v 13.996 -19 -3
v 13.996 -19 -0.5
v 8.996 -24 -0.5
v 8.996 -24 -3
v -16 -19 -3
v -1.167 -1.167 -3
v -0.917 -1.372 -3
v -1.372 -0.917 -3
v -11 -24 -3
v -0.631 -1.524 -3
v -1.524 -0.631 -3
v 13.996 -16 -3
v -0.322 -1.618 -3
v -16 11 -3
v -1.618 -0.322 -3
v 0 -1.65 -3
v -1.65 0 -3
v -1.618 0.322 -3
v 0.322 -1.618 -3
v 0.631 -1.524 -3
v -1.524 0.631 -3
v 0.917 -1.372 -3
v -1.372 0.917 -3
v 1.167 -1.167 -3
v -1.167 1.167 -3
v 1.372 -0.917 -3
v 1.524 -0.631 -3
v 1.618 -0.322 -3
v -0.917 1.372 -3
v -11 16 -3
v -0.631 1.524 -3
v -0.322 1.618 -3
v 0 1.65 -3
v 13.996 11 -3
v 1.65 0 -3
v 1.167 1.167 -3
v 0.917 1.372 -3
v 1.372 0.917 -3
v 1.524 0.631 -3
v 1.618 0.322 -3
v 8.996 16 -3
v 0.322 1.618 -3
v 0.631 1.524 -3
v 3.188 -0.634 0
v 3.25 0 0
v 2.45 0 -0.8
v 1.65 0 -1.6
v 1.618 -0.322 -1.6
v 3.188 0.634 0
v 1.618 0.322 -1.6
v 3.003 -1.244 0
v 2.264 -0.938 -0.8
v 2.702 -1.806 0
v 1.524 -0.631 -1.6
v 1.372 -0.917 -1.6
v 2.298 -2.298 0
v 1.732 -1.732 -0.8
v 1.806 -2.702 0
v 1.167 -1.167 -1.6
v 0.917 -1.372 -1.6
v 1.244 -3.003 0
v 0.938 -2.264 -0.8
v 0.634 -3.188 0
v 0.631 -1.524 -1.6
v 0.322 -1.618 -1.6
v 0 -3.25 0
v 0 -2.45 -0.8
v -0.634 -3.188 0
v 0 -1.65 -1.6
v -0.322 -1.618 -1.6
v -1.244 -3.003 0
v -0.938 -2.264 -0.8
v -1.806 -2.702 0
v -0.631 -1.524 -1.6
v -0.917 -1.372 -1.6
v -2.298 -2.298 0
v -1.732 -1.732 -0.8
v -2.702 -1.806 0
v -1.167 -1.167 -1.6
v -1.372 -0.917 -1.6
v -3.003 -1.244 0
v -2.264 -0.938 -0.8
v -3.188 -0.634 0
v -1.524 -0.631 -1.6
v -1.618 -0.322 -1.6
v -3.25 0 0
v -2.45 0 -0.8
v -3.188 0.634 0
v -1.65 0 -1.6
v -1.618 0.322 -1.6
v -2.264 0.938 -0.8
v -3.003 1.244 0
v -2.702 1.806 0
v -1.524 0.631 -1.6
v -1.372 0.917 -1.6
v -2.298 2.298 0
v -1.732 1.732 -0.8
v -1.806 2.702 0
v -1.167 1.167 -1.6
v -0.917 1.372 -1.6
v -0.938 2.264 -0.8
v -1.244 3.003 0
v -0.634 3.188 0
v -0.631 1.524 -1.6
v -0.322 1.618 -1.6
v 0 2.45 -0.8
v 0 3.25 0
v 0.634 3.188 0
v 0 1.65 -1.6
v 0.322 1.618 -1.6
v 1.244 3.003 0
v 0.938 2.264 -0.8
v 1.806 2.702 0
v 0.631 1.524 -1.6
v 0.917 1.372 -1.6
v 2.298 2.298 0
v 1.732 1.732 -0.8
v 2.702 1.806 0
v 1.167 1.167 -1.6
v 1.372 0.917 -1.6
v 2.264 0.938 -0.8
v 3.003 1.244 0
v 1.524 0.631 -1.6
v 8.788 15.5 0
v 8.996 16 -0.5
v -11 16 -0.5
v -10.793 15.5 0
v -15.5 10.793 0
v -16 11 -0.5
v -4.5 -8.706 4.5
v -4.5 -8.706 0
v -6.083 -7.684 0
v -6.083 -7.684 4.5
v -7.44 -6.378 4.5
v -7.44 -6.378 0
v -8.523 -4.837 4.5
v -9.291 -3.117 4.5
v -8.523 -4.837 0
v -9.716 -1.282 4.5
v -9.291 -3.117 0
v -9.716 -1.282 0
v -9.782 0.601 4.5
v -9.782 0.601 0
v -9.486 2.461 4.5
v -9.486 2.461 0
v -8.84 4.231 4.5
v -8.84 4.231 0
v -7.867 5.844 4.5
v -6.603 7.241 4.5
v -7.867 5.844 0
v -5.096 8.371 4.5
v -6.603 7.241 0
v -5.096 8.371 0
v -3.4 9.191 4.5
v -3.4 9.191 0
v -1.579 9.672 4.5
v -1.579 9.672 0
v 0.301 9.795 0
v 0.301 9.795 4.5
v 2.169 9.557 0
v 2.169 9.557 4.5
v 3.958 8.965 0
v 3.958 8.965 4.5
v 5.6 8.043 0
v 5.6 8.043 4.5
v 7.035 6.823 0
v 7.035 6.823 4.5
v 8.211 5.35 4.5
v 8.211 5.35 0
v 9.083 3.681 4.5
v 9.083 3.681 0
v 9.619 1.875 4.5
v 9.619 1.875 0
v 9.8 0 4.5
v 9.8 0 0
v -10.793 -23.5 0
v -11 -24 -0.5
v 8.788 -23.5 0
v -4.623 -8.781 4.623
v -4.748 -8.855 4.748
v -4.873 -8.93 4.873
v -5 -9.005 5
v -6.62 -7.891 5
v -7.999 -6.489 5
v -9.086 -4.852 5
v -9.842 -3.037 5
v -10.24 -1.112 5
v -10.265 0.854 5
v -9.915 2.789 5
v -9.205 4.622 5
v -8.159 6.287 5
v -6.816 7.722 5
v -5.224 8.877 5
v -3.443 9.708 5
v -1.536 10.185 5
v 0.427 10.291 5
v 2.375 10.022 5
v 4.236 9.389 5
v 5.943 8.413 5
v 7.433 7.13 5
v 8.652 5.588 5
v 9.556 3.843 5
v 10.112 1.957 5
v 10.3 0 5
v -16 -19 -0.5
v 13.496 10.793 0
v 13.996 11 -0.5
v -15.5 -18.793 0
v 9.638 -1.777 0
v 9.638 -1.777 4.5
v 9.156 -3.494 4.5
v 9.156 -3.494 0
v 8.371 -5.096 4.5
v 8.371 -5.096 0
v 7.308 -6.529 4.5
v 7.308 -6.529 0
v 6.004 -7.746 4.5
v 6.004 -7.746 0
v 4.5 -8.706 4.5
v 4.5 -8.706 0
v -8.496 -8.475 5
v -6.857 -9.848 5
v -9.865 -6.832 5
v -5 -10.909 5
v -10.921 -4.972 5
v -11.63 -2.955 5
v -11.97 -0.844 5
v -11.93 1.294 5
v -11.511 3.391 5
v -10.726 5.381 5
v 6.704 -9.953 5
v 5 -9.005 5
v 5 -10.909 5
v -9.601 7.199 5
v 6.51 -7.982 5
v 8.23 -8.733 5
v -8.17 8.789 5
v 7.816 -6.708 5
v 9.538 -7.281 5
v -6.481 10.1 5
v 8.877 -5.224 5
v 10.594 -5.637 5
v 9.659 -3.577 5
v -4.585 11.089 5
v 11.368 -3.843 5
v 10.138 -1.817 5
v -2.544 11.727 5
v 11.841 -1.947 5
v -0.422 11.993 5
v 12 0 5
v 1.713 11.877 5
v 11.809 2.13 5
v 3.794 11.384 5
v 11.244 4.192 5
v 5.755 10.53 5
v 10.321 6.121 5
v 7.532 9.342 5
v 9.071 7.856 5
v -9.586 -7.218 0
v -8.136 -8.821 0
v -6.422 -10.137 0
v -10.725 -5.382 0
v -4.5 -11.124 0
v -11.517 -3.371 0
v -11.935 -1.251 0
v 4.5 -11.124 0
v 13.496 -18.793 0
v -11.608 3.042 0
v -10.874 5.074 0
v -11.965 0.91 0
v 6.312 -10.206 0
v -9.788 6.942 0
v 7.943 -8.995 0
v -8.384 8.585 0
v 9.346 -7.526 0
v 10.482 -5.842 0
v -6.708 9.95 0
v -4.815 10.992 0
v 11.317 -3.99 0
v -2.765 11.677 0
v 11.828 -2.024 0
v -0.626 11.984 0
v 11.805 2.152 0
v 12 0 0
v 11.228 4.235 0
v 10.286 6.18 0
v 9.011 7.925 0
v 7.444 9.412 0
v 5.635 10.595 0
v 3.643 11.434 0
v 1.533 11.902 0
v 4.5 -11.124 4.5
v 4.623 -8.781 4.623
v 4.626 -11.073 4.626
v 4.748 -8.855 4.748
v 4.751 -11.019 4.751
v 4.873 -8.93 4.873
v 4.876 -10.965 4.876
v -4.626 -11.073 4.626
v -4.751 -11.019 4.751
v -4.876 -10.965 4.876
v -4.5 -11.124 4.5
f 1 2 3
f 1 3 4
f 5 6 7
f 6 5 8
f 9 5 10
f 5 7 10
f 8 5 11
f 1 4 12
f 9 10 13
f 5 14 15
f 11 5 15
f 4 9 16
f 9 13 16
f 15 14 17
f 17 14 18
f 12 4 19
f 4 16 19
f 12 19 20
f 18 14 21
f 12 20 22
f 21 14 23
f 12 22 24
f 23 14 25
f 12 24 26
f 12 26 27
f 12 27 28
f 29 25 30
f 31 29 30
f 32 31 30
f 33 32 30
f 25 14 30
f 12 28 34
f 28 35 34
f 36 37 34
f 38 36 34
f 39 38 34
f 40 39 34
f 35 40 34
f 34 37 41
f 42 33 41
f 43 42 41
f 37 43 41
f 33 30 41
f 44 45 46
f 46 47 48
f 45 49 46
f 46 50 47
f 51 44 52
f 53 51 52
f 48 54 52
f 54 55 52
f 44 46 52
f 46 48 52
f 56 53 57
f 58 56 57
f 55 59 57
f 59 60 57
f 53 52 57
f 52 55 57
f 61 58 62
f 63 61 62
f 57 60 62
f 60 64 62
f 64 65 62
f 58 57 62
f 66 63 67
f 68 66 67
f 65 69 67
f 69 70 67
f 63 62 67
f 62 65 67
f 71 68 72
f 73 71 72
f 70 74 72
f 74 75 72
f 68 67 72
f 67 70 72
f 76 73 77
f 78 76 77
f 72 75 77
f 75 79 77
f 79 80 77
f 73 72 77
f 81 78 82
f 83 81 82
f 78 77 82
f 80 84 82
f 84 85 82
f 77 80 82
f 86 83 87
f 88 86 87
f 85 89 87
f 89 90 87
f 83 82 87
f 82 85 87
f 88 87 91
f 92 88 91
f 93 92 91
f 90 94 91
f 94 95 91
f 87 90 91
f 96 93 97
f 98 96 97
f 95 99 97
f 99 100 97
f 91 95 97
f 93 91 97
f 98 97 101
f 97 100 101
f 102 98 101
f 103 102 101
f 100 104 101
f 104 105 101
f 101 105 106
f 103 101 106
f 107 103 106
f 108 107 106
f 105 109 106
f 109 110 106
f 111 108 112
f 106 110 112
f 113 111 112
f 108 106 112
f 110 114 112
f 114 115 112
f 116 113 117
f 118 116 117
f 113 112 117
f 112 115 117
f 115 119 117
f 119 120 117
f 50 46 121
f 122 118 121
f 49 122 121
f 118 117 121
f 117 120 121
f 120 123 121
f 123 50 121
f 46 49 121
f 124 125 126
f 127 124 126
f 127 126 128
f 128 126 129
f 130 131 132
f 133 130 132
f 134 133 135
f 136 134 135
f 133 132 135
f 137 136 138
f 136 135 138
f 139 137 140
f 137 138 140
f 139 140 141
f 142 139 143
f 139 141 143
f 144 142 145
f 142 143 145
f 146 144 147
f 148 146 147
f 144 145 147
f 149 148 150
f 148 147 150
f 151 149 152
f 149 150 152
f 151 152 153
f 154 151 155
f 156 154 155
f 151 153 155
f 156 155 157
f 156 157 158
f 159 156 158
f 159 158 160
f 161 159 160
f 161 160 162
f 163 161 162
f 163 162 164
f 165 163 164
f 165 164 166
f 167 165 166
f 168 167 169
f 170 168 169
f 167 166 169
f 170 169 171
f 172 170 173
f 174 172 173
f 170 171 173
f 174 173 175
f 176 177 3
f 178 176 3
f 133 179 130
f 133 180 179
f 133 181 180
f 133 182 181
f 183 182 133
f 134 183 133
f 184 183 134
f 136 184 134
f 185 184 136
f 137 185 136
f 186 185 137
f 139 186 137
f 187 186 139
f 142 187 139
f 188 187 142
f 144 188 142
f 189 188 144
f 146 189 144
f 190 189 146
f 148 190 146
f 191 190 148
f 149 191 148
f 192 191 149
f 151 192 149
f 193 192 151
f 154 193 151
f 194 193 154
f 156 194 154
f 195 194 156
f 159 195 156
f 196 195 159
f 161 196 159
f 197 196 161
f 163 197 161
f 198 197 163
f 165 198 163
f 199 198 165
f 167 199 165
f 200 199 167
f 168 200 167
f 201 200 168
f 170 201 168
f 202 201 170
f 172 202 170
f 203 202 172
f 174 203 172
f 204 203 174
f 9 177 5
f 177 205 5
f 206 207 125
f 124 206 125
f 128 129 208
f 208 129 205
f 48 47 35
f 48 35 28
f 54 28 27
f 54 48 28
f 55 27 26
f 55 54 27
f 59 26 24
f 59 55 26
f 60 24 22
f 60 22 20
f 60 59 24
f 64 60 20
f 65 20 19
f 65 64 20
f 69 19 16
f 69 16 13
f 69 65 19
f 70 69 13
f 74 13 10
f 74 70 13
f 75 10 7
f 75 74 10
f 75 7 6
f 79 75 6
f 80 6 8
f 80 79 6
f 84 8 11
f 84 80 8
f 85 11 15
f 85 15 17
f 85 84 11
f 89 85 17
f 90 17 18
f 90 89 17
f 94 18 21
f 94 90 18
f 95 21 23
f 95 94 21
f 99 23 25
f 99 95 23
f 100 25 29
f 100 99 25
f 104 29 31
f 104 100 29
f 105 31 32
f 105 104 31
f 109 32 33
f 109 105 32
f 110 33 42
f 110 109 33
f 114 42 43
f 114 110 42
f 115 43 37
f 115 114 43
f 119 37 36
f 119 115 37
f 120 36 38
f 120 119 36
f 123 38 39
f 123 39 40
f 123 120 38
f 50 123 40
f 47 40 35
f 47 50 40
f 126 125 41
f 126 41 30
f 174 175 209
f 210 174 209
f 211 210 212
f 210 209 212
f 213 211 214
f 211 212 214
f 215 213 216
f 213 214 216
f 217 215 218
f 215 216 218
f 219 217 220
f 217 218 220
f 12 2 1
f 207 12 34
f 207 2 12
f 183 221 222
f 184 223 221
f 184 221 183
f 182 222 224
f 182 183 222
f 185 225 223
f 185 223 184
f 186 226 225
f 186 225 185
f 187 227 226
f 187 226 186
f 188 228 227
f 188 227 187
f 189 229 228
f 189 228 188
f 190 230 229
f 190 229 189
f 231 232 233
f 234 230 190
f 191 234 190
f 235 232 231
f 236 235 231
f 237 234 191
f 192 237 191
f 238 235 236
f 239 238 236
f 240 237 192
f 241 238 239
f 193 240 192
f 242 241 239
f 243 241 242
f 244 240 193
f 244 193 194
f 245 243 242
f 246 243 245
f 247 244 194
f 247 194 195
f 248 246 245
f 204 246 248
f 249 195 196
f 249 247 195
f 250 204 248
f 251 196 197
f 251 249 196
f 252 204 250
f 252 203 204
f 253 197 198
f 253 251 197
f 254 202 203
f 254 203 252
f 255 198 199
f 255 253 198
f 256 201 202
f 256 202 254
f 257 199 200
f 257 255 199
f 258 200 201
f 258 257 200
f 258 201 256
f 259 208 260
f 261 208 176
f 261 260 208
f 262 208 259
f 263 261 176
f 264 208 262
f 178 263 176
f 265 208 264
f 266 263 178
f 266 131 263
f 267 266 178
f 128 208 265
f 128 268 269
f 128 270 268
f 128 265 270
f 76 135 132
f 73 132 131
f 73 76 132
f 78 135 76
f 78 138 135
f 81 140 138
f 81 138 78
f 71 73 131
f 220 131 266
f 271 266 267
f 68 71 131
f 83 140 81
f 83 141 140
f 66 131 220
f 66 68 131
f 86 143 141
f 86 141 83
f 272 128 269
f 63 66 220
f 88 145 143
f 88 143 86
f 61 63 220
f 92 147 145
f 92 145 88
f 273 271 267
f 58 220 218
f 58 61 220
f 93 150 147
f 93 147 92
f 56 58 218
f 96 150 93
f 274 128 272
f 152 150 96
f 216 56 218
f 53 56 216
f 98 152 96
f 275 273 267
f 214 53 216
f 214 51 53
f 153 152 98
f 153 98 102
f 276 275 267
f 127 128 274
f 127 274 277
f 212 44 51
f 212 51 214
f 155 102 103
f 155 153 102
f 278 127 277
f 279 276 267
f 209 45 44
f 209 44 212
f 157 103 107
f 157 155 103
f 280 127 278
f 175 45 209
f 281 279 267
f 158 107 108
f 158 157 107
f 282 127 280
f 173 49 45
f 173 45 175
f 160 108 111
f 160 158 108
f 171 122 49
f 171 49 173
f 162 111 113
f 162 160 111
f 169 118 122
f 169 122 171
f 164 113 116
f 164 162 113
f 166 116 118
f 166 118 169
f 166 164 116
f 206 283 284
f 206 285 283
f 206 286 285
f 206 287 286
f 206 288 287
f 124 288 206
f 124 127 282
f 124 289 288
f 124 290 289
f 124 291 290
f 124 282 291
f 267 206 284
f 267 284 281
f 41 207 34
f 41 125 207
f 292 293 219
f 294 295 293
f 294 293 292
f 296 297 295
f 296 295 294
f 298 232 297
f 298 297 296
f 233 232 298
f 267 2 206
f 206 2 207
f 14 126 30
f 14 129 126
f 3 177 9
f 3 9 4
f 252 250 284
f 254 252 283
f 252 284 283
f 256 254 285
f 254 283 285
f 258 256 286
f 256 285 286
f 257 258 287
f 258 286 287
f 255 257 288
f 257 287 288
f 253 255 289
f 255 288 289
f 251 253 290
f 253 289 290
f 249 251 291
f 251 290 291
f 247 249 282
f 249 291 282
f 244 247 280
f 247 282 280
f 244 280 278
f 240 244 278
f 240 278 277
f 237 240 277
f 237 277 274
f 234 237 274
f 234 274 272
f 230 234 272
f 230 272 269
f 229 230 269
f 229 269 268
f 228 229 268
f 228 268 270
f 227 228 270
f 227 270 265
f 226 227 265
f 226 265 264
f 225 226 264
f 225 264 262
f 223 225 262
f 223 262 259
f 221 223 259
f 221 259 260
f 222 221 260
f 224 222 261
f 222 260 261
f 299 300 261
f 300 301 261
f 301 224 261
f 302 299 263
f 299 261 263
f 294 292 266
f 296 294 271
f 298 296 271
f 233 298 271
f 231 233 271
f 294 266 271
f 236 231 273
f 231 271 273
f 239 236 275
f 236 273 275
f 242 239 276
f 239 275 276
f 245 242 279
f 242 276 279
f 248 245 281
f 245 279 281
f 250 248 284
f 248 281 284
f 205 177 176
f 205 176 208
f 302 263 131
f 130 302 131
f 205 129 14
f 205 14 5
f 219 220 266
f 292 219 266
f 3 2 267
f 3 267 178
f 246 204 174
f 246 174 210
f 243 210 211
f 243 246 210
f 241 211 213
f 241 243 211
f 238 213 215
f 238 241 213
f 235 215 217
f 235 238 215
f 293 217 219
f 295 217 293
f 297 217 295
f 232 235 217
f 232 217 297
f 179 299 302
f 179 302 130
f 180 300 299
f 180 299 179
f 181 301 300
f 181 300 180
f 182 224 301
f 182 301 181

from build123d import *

# Parameters (mm, degrees)
F0_W     = 11.5
F0_H     = 8
F0_W_2   = 9
F0_W_3   = 9.4955122173
F1_DEPTH = 3
F2_DEPTH = 5
F3_SIZE  = 1.6
F4_SIZE  = 5
F5_SIZE  = 0.5


with BuildPart() as f1:
    # F0 (on Top) → F1 (new body)
    with BuildSketch(Plane.XY):
        with BuildLine():
            Line((-4.5, -16), (-4.5, -11.1242977306))
            ThreePointArc((-4.5, -11.1242977306), (-6.7082039325, 9.9498743711), (12, 0))
            ThreePointArc((12, 0), (9.9498743711, -6.7082039325), (4.5, -11.1242977306))
            Line((4.5, -11.1242977306), (4.5, -16))
            Line((4.5, -16), (13.9955122173, -16))
            Line((13.9955122173, -16), (13.9955122173, 16))
            Line((13.9955122173, 16), (-16, 16))
            Line((-16, 16), (-16, -16))
            Line((-16, -16), (-4.5, -16))
        make_face()
        with BuildLine():
            ThreePointArc((-4.5, -8.7057452294), (-5.0960769225, 8.3707825202), (9.8, 0))
            ThreePointArc((9.8, 0), (8.3707825202, -5.0960769225), (4.5, -8.7057452294))
            Line((4.5, -8.7057452294), (4.5, -11.1242977306))
            ThreePointArc((4.5, -11.1242977306), (9.9498743711, -6.7082039325), (12, 0))
            ThreePointArc((12, 0), (-6.7082039325, 9.9498743711), (-4.5, -11.1242977306))
            Line((-4.5, -11.1242977306), (-4.5, -8.7057452294))
        make_face()
        with BuildLine():
            ThreePointArc((4.5, -8.7057452294), (8.3707825202, -5.0960769225), (9.8, 0))
            ThreePointArc((9.8, 0), (-5.0960769225, 8.3707825202), (-4.5, -8.7057452294))
            Line((-4.5, -8.7057452294), (-4.5, 0))
            Line((-4.5, 0), (-1.65, 0))
            ThreePointArc((-1.65, 0), (0, 1.65), (1.65, 0))
            Line((1.65, 0), (4.5, 0))
            Line((4.5, 0), (4.5, -8.7057452294))
        make_face()
        with BuildLine():
            Line((-4.5, 0), (-4.5, -8.7057452294))
            ThreePointArc((-4.5, -8.7057452294), (0, -9.8), (4.5, -8.7057452294))
            Line((4.5, -8.7057452294), (4.5, 0))
            Line((4.5, 0), (1.65, 0))
            ThreePointArc((1.65, 0), (0, -1.65), (-1.65, 0))
            Line((-1.65, 0), (-4.5, 0))
        make_face()
        with BuildLine():
            ThreePointArc((4.5, -8.7057452294), (0, -9.8), (-4.5, -8.7057452294))
            Line((-4.5, -8.7057452294), (-4.5, -11.1242977306))
            ThreePointArc((-4.5, -11.1242977306), (0, -12), (4.5, -11.1242977306))
            Line((4.5, -11.1242977306), (4.5, -8.7057452294))
        make_face()
        with BuildLine():
            ThreePointArc((4.5, -11.1242977306), (0, -12), (-4.5, -11.1242977306))
            Line((-4.5, -11.1242977306), (-4.5, -16))
            Line((-4.5, -16), (4.5, -16))
            Line((4.5, -16), (4.5, -11.1242977306))
        make_face()
        with Locations((-10.25, -20)):
            Rectangle(F0_W, F0_H)
        with Locations((0, -20)):
            Rectangle(F0_W_2, F0_H)
        with Locations((9.2477561086, -20)):
            Rectangle(F0_W_3, F0_H)
    extrude(amount=-F1_DEPTH)

    # F0 (on Top) → F2 (join)
    with BuildSketch(Plane.XY):
        with BuildLine():
            ThreePointArc((-4.5, -8.7057452294), (-5.0960769225, 8.3707825202), (9.8, 0))
            ThreePointArc((9.8, 0), (8.3707825202, -5.0960769225), (4.5, -8.7057452294))
            Line((4.5, -8.7057452294), (4.5, -11.1242977306))
            ThreePointArc((4.5, -11.1242977306), (9.9498743711, -6.7082039325), (12, 0))
            ThreePointArc((12, 0), (-6.7082039325, 9.9498743711), (-4.5, -11.1242977306))
            Line((-4.5, -11.1242977306), (-4.5, -8.7057452294))
        make_face()
    extrude(amount=F2_DEPTH)

    # F3
    f3_edges = [f1.edges().sort_by_distance(p)[0] for p in [
        (-1.65, 0, 0),
    ]]
    chamfer(f3_edges, length=F3_SIZE)

    # F4
    f4_edges = [f1.edges().sort_by_distance(p)[0] for p in [
        (-16, -24, -1.5),
        (13.995512, -24, -1.5),
        (-16, 16, -1.5),
        (13.995512, 16, -1.5),
    ]]
    chamfer(f4_edges, length=F4_SIZE)

    # F5
    f5_edges = [f1.edges().sort_by_distance(p)[0] for p in [
        (-5.096077, 8.370783, 5),
        (-1.002244, -24, 0),
        (11.495512, -21.5, 0),
        (13.995512, -4, 0),
        (-13.5, -21.5, 0),
        (-16, -4, 0),
        (-13.5, 13.5, 0),
        (-1.002244, 16, 0),
        (11.495512, 13.5, 0),
        (-4.5, -9.915021, 5),
        (4.5, -9.915021, 5),
    ]]
    chamfer(f5_edges, length=F5_SIZE)


solid = f1.part
